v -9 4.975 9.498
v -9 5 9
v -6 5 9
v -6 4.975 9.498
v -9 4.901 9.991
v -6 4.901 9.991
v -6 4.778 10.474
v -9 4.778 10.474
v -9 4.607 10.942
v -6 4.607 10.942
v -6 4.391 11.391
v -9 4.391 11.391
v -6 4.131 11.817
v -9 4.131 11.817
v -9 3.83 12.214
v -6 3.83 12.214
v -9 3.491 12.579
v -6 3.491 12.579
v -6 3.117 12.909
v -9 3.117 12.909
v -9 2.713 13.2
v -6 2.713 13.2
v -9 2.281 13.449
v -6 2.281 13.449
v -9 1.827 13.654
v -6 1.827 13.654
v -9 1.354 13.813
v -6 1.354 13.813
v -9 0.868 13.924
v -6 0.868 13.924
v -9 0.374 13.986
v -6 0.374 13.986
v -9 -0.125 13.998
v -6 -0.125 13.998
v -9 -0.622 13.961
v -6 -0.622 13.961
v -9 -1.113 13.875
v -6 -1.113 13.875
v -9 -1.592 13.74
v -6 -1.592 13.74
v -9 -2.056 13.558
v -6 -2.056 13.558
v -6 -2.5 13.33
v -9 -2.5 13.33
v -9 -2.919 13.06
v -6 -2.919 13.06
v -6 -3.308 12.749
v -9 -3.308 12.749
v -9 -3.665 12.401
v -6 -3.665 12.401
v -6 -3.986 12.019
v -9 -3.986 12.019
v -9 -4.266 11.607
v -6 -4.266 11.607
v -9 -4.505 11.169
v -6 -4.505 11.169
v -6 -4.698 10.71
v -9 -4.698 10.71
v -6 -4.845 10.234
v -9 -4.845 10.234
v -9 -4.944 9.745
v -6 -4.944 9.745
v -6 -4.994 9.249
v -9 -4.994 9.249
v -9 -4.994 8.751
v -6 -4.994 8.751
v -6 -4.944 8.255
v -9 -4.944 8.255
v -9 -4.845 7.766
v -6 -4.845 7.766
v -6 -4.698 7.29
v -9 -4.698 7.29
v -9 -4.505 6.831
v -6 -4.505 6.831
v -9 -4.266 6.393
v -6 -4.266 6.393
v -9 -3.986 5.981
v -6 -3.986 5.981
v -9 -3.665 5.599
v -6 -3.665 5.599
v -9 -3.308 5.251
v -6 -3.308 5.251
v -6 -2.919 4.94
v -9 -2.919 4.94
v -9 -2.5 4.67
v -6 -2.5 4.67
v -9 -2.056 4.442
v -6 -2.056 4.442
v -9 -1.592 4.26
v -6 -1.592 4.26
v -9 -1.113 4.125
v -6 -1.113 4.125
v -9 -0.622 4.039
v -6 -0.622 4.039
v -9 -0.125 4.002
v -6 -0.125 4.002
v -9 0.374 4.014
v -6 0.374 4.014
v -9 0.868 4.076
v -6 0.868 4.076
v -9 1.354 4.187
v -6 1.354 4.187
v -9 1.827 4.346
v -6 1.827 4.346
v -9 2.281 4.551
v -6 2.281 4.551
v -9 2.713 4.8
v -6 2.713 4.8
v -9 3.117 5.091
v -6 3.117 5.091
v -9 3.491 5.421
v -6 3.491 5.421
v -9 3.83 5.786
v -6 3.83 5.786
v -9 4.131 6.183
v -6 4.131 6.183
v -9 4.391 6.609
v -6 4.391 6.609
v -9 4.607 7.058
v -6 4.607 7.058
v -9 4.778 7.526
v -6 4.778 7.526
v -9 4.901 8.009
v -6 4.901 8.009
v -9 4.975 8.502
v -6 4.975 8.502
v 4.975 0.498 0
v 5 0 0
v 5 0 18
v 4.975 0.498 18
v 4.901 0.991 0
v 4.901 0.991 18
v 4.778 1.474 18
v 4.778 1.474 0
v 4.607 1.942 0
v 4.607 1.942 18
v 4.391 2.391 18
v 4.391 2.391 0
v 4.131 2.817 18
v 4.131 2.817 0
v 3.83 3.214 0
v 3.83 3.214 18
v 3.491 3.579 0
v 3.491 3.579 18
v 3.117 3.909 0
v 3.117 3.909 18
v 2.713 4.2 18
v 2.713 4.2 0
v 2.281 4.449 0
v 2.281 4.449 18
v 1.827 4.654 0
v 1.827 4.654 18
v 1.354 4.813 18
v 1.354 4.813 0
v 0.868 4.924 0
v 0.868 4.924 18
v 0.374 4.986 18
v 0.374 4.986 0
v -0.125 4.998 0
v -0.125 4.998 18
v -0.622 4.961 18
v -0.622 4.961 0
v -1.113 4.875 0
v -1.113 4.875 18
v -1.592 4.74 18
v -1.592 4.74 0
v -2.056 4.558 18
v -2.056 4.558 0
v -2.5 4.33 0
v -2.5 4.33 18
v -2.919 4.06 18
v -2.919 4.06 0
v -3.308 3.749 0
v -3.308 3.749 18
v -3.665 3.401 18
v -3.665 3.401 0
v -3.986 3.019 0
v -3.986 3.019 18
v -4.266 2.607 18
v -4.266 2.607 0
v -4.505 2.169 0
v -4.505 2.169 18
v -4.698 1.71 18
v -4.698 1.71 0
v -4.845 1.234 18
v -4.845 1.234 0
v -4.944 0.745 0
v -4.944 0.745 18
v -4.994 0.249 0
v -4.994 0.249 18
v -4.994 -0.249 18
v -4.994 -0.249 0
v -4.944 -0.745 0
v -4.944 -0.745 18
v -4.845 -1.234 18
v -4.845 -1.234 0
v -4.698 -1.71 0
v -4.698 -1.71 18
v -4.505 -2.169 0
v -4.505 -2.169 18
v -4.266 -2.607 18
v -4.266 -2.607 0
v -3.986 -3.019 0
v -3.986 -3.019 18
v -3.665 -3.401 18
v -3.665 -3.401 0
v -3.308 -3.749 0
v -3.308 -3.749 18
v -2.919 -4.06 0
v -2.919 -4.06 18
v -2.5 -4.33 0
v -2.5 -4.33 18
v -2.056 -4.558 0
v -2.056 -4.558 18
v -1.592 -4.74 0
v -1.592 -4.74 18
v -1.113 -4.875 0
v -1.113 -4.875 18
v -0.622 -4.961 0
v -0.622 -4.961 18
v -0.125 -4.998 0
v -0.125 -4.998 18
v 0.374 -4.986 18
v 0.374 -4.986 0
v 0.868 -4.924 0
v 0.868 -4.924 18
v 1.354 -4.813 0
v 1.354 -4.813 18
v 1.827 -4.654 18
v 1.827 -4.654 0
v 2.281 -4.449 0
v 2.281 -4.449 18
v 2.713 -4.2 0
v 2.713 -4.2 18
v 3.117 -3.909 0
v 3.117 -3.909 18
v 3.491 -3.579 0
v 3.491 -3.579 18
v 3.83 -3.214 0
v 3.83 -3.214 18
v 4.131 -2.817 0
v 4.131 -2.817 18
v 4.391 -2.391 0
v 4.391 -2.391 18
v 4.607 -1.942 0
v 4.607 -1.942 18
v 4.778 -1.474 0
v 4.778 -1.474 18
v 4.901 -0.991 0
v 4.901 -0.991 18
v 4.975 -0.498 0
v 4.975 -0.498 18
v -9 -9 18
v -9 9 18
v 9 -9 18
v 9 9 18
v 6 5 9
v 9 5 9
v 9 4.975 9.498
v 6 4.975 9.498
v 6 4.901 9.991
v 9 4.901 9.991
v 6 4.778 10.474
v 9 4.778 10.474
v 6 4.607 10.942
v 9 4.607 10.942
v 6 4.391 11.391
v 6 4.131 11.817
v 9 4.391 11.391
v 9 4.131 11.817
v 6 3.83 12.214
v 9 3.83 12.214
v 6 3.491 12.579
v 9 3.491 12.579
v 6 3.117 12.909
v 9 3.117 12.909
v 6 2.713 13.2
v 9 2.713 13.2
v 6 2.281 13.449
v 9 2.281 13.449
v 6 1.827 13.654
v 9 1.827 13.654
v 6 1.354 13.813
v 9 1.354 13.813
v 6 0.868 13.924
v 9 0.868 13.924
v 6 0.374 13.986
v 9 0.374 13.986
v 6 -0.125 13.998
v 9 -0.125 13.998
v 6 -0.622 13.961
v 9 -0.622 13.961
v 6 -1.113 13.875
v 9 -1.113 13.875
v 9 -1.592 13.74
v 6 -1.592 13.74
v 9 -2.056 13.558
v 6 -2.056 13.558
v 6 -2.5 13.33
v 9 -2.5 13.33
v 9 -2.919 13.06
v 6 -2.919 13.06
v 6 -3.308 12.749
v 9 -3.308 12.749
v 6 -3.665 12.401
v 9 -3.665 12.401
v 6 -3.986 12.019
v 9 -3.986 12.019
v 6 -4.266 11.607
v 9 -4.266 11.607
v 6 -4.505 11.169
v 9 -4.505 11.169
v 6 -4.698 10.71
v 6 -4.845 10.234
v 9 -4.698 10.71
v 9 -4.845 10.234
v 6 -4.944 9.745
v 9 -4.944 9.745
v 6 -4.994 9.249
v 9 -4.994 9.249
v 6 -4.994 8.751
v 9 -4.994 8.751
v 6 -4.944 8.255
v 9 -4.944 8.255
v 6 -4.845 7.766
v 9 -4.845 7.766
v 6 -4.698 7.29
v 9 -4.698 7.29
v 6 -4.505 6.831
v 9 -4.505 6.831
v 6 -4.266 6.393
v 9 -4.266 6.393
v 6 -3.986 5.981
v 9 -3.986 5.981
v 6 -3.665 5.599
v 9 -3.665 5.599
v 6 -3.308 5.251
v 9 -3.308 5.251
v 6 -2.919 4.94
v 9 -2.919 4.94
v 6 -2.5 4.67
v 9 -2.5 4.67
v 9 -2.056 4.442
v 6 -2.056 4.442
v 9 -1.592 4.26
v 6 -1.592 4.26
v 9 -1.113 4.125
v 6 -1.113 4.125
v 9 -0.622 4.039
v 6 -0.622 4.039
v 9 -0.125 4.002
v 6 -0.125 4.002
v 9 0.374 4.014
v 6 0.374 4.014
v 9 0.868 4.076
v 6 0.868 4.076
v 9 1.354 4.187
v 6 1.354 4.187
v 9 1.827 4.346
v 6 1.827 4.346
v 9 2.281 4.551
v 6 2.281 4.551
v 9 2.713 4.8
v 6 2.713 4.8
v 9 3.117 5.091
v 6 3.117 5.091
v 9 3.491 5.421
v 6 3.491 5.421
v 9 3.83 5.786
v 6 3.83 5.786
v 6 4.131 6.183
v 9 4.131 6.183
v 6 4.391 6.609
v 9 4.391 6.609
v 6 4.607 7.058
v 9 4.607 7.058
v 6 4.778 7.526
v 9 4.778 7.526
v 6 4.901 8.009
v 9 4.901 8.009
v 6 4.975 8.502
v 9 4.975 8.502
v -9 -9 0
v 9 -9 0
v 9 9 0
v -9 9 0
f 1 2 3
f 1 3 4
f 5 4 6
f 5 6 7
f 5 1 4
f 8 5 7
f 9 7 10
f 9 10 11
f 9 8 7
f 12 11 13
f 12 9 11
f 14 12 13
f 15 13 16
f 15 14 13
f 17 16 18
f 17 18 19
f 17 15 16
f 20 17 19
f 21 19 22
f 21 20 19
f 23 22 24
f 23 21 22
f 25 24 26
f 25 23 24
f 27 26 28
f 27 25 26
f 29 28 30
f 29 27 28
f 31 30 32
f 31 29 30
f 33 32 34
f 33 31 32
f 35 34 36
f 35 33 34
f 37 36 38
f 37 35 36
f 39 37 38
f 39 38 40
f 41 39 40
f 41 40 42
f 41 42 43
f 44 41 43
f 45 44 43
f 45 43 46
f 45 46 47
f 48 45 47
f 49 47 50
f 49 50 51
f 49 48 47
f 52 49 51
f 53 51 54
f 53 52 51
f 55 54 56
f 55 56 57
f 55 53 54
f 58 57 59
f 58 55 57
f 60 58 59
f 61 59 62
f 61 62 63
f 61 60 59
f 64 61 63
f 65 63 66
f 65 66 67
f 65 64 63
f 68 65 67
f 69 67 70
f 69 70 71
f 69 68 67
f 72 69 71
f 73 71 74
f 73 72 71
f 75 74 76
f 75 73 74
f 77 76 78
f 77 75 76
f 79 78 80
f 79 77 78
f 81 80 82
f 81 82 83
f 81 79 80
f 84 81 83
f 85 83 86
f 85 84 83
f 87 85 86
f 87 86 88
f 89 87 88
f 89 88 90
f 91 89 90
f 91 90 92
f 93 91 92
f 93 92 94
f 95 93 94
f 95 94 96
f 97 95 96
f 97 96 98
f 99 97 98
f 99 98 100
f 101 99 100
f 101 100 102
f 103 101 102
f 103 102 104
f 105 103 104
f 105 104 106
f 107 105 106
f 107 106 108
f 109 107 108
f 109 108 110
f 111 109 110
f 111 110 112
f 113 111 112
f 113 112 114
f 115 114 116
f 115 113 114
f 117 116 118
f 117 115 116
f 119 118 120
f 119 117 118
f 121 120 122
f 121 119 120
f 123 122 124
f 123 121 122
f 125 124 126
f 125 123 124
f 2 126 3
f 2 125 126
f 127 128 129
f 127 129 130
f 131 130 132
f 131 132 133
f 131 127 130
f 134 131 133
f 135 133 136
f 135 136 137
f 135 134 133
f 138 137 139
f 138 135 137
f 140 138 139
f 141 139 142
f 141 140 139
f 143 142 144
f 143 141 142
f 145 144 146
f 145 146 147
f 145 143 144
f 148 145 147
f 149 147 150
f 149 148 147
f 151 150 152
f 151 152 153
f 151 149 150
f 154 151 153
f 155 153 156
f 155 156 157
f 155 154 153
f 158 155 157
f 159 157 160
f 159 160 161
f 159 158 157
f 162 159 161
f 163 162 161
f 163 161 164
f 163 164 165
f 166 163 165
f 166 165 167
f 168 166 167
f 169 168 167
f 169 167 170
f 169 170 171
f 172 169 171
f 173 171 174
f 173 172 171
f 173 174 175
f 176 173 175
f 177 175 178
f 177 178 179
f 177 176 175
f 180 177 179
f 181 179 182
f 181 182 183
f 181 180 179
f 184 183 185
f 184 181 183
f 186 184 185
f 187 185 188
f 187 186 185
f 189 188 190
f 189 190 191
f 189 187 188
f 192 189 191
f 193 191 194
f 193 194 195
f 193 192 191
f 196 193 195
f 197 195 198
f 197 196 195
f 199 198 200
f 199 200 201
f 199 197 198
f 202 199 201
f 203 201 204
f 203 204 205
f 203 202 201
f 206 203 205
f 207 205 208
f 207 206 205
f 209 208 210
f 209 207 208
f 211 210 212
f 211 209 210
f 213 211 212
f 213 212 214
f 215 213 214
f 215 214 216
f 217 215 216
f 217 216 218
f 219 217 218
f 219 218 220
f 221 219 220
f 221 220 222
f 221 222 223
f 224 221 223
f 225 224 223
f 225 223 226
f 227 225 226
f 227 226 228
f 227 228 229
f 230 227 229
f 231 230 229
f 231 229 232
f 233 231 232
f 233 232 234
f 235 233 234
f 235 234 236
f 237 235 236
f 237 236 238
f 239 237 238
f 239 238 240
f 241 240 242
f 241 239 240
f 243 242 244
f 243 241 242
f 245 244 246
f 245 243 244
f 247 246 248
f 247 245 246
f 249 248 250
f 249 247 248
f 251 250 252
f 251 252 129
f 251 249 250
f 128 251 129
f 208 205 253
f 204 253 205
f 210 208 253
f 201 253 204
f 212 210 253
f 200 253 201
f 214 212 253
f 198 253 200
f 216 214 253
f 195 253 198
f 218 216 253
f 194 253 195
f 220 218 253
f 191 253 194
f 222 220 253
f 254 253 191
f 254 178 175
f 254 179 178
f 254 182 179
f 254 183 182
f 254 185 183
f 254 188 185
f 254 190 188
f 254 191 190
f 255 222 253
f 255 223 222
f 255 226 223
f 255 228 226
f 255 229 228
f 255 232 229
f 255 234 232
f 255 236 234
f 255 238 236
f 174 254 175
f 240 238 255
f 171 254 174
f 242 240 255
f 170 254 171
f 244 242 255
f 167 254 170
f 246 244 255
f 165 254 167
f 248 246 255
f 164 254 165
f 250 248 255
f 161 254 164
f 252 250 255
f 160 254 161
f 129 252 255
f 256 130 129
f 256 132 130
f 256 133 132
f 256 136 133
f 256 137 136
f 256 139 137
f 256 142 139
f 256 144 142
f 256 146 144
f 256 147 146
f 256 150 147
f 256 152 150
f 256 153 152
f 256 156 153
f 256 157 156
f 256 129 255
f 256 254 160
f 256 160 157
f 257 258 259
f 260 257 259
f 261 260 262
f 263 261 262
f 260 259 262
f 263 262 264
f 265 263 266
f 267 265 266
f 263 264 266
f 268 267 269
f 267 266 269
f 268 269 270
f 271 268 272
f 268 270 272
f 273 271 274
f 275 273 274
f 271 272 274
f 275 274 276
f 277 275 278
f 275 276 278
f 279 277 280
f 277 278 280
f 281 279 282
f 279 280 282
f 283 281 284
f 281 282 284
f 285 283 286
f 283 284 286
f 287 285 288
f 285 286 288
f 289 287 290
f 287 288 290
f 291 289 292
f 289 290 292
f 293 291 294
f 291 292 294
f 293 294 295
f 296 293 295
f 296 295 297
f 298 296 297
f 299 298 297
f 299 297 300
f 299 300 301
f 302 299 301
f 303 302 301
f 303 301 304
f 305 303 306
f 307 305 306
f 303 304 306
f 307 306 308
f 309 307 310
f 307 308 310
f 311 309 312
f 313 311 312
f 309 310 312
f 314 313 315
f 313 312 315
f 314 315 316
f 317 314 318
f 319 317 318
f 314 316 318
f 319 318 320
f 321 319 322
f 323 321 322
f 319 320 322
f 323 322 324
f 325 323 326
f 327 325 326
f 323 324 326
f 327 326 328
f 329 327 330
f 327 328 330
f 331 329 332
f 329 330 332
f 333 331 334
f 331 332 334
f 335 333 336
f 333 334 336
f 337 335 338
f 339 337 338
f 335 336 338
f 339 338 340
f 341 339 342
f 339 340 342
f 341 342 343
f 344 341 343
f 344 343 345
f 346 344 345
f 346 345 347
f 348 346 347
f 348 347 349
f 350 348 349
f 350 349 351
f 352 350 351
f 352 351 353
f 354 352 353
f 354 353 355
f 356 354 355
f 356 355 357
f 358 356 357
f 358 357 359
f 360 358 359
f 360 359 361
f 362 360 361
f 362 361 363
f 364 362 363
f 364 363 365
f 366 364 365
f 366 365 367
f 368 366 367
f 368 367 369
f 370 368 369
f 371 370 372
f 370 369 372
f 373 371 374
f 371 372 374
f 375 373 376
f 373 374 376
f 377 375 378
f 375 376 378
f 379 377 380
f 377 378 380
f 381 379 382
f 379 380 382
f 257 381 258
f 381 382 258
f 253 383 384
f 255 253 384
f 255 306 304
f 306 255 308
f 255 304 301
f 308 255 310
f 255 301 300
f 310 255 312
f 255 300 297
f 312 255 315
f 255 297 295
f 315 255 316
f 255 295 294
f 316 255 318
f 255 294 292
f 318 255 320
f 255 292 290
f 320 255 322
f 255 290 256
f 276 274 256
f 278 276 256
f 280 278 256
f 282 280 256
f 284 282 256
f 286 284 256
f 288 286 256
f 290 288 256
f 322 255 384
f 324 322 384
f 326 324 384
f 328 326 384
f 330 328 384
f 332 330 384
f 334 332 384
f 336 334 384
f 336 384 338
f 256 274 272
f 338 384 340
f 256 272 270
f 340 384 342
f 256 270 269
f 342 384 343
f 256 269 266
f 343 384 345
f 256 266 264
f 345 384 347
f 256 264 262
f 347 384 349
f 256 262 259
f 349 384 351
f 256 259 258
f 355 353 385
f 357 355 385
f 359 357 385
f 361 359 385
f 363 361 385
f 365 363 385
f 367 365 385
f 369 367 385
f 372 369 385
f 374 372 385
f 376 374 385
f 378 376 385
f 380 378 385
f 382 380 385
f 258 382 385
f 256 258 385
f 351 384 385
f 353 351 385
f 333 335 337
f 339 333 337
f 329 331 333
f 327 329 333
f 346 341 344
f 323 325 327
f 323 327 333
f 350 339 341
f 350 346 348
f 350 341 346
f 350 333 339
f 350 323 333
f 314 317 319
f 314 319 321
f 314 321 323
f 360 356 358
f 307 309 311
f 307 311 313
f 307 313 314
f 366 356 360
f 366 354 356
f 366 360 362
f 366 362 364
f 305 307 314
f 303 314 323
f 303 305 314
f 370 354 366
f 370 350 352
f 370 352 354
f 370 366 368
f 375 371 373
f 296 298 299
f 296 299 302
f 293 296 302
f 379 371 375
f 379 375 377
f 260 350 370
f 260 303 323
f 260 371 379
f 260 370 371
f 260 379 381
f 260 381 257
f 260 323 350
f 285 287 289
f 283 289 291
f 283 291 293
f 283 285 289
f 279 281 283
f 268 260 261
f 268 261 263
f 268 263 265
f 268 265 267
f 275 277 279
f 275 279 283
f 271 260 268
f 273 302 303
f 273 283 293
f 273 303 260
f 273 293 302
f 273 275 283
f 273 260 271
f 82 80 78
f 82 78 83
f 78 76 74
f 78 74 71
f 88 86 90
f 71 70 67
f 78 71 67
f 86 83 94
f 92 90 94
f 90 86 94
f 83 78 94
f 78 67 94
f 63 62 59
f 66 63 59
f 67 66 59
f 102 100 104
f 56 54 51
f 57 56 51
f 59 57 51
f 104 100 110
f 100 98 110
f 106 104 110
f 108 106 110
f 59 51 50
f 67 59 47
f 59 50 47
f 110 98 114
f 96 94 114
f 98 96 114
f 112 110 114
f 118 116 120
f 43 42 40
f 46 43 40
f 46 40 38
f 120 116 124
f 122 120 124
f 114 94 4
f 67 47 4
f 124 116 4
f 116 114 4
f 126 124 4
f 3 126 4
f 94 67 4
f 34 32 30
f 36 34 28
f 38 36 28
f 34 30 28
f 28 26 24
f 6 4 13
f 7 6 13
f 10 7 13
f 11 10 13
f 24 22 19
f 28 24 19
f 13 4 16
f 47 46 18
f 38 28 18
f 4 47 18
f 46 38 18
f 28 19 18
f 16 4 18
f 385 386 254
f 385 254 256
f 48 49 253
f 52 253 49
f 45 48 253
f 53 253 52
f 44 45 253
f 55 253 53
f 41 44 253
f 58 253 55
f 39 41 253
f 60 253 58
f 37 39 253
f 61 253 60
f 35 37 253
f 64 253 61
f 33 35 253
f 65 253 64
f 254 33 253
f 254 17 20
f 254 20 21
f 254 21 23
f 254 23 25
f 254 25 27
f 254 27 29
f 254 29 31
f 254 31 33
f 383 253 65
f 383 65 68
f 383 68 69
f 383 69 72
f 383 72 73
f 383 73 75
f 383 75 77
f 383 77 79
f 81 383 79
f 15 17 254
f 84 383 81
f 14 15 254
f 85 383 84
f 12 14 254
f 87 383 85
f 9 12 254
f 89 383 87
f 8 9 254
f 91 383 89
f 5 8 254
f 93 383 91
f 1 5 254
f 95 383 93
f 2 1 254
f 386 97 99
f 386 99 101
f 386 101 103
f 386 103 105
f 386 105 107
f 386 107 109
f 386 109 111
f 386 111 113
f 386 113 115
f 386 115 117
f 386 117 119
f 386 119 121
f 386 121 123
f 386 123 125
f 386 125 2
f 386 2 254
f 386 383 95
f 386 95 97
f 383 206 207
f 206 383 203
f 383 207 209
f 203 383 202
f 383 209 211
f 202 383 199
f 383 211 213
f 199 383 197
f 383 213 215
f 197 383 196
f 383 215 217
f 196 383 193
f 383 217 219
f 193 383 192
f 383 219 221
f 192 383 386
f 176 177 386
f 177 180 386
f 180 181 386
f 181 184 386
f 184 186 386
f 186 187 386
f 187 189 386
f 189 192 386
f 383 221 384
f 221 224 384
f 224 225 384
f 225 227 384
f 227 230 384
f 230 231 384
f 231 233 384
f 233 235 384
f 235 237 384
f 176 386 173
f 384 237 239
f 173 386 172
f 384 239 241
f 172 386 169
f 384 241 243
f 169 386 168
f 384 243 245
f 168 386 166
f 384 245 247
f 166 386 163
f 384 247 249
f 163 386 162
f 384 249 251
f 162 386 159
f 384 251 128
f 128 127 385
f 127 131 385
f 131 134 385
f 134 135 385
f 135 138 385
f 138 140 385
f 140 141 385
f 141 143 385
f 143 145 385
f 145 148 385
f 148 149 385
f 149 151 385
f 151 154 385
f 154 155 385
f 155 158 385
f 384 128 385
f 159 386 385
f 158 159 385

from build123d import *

# Parameters (mm, degrees)
SKETCH1_W           = 18
SKETCH1_H           = 18
SKETCH1_R           = 5
BOSS_EXTRUDE1_DEPTH = 18
SKETCH2_R           = 5
CUT_EXTRUDE1_DEPTH  = 3


with BuildPart() as part:
    # Sketch1 → Boss-Extrude1 (new body)
    with BuildSketch(Plane.XY):
        Rectangle(SKETCH1_W, SKETCH1_H)
        Circle(SKETCH1_R, mode=Mode.SUBTRACT)
    extrude(amount=BOSS_EXTRUDE1_DEPTH)

    # Sketch2 → Cut-Extrude1 (cut)
    with BuildSketch(Plane(origin=(9, 0, 0), x_dir=(0, 0, -1), z_dir=(1, 0, 0))):
        with Locations(Location((-9, 0, 0), (0, 0, 90))):
            Circle(SKETCH2_R)
    cut_extrude1 = extrude(amount=-CUT_EXTRUDE1_DEPTH, mode=Mode.SUBTRACT)

    # Mirror1: Cut-Extrude1 across plane
    add(cut_extrude1.mirror(Plane(origin=(0, 0, 0), x_dir=(0, 0, 1), z_dir=(1, 0, 0))), mode=Mode.SUBTRACT)


solid = part.part
